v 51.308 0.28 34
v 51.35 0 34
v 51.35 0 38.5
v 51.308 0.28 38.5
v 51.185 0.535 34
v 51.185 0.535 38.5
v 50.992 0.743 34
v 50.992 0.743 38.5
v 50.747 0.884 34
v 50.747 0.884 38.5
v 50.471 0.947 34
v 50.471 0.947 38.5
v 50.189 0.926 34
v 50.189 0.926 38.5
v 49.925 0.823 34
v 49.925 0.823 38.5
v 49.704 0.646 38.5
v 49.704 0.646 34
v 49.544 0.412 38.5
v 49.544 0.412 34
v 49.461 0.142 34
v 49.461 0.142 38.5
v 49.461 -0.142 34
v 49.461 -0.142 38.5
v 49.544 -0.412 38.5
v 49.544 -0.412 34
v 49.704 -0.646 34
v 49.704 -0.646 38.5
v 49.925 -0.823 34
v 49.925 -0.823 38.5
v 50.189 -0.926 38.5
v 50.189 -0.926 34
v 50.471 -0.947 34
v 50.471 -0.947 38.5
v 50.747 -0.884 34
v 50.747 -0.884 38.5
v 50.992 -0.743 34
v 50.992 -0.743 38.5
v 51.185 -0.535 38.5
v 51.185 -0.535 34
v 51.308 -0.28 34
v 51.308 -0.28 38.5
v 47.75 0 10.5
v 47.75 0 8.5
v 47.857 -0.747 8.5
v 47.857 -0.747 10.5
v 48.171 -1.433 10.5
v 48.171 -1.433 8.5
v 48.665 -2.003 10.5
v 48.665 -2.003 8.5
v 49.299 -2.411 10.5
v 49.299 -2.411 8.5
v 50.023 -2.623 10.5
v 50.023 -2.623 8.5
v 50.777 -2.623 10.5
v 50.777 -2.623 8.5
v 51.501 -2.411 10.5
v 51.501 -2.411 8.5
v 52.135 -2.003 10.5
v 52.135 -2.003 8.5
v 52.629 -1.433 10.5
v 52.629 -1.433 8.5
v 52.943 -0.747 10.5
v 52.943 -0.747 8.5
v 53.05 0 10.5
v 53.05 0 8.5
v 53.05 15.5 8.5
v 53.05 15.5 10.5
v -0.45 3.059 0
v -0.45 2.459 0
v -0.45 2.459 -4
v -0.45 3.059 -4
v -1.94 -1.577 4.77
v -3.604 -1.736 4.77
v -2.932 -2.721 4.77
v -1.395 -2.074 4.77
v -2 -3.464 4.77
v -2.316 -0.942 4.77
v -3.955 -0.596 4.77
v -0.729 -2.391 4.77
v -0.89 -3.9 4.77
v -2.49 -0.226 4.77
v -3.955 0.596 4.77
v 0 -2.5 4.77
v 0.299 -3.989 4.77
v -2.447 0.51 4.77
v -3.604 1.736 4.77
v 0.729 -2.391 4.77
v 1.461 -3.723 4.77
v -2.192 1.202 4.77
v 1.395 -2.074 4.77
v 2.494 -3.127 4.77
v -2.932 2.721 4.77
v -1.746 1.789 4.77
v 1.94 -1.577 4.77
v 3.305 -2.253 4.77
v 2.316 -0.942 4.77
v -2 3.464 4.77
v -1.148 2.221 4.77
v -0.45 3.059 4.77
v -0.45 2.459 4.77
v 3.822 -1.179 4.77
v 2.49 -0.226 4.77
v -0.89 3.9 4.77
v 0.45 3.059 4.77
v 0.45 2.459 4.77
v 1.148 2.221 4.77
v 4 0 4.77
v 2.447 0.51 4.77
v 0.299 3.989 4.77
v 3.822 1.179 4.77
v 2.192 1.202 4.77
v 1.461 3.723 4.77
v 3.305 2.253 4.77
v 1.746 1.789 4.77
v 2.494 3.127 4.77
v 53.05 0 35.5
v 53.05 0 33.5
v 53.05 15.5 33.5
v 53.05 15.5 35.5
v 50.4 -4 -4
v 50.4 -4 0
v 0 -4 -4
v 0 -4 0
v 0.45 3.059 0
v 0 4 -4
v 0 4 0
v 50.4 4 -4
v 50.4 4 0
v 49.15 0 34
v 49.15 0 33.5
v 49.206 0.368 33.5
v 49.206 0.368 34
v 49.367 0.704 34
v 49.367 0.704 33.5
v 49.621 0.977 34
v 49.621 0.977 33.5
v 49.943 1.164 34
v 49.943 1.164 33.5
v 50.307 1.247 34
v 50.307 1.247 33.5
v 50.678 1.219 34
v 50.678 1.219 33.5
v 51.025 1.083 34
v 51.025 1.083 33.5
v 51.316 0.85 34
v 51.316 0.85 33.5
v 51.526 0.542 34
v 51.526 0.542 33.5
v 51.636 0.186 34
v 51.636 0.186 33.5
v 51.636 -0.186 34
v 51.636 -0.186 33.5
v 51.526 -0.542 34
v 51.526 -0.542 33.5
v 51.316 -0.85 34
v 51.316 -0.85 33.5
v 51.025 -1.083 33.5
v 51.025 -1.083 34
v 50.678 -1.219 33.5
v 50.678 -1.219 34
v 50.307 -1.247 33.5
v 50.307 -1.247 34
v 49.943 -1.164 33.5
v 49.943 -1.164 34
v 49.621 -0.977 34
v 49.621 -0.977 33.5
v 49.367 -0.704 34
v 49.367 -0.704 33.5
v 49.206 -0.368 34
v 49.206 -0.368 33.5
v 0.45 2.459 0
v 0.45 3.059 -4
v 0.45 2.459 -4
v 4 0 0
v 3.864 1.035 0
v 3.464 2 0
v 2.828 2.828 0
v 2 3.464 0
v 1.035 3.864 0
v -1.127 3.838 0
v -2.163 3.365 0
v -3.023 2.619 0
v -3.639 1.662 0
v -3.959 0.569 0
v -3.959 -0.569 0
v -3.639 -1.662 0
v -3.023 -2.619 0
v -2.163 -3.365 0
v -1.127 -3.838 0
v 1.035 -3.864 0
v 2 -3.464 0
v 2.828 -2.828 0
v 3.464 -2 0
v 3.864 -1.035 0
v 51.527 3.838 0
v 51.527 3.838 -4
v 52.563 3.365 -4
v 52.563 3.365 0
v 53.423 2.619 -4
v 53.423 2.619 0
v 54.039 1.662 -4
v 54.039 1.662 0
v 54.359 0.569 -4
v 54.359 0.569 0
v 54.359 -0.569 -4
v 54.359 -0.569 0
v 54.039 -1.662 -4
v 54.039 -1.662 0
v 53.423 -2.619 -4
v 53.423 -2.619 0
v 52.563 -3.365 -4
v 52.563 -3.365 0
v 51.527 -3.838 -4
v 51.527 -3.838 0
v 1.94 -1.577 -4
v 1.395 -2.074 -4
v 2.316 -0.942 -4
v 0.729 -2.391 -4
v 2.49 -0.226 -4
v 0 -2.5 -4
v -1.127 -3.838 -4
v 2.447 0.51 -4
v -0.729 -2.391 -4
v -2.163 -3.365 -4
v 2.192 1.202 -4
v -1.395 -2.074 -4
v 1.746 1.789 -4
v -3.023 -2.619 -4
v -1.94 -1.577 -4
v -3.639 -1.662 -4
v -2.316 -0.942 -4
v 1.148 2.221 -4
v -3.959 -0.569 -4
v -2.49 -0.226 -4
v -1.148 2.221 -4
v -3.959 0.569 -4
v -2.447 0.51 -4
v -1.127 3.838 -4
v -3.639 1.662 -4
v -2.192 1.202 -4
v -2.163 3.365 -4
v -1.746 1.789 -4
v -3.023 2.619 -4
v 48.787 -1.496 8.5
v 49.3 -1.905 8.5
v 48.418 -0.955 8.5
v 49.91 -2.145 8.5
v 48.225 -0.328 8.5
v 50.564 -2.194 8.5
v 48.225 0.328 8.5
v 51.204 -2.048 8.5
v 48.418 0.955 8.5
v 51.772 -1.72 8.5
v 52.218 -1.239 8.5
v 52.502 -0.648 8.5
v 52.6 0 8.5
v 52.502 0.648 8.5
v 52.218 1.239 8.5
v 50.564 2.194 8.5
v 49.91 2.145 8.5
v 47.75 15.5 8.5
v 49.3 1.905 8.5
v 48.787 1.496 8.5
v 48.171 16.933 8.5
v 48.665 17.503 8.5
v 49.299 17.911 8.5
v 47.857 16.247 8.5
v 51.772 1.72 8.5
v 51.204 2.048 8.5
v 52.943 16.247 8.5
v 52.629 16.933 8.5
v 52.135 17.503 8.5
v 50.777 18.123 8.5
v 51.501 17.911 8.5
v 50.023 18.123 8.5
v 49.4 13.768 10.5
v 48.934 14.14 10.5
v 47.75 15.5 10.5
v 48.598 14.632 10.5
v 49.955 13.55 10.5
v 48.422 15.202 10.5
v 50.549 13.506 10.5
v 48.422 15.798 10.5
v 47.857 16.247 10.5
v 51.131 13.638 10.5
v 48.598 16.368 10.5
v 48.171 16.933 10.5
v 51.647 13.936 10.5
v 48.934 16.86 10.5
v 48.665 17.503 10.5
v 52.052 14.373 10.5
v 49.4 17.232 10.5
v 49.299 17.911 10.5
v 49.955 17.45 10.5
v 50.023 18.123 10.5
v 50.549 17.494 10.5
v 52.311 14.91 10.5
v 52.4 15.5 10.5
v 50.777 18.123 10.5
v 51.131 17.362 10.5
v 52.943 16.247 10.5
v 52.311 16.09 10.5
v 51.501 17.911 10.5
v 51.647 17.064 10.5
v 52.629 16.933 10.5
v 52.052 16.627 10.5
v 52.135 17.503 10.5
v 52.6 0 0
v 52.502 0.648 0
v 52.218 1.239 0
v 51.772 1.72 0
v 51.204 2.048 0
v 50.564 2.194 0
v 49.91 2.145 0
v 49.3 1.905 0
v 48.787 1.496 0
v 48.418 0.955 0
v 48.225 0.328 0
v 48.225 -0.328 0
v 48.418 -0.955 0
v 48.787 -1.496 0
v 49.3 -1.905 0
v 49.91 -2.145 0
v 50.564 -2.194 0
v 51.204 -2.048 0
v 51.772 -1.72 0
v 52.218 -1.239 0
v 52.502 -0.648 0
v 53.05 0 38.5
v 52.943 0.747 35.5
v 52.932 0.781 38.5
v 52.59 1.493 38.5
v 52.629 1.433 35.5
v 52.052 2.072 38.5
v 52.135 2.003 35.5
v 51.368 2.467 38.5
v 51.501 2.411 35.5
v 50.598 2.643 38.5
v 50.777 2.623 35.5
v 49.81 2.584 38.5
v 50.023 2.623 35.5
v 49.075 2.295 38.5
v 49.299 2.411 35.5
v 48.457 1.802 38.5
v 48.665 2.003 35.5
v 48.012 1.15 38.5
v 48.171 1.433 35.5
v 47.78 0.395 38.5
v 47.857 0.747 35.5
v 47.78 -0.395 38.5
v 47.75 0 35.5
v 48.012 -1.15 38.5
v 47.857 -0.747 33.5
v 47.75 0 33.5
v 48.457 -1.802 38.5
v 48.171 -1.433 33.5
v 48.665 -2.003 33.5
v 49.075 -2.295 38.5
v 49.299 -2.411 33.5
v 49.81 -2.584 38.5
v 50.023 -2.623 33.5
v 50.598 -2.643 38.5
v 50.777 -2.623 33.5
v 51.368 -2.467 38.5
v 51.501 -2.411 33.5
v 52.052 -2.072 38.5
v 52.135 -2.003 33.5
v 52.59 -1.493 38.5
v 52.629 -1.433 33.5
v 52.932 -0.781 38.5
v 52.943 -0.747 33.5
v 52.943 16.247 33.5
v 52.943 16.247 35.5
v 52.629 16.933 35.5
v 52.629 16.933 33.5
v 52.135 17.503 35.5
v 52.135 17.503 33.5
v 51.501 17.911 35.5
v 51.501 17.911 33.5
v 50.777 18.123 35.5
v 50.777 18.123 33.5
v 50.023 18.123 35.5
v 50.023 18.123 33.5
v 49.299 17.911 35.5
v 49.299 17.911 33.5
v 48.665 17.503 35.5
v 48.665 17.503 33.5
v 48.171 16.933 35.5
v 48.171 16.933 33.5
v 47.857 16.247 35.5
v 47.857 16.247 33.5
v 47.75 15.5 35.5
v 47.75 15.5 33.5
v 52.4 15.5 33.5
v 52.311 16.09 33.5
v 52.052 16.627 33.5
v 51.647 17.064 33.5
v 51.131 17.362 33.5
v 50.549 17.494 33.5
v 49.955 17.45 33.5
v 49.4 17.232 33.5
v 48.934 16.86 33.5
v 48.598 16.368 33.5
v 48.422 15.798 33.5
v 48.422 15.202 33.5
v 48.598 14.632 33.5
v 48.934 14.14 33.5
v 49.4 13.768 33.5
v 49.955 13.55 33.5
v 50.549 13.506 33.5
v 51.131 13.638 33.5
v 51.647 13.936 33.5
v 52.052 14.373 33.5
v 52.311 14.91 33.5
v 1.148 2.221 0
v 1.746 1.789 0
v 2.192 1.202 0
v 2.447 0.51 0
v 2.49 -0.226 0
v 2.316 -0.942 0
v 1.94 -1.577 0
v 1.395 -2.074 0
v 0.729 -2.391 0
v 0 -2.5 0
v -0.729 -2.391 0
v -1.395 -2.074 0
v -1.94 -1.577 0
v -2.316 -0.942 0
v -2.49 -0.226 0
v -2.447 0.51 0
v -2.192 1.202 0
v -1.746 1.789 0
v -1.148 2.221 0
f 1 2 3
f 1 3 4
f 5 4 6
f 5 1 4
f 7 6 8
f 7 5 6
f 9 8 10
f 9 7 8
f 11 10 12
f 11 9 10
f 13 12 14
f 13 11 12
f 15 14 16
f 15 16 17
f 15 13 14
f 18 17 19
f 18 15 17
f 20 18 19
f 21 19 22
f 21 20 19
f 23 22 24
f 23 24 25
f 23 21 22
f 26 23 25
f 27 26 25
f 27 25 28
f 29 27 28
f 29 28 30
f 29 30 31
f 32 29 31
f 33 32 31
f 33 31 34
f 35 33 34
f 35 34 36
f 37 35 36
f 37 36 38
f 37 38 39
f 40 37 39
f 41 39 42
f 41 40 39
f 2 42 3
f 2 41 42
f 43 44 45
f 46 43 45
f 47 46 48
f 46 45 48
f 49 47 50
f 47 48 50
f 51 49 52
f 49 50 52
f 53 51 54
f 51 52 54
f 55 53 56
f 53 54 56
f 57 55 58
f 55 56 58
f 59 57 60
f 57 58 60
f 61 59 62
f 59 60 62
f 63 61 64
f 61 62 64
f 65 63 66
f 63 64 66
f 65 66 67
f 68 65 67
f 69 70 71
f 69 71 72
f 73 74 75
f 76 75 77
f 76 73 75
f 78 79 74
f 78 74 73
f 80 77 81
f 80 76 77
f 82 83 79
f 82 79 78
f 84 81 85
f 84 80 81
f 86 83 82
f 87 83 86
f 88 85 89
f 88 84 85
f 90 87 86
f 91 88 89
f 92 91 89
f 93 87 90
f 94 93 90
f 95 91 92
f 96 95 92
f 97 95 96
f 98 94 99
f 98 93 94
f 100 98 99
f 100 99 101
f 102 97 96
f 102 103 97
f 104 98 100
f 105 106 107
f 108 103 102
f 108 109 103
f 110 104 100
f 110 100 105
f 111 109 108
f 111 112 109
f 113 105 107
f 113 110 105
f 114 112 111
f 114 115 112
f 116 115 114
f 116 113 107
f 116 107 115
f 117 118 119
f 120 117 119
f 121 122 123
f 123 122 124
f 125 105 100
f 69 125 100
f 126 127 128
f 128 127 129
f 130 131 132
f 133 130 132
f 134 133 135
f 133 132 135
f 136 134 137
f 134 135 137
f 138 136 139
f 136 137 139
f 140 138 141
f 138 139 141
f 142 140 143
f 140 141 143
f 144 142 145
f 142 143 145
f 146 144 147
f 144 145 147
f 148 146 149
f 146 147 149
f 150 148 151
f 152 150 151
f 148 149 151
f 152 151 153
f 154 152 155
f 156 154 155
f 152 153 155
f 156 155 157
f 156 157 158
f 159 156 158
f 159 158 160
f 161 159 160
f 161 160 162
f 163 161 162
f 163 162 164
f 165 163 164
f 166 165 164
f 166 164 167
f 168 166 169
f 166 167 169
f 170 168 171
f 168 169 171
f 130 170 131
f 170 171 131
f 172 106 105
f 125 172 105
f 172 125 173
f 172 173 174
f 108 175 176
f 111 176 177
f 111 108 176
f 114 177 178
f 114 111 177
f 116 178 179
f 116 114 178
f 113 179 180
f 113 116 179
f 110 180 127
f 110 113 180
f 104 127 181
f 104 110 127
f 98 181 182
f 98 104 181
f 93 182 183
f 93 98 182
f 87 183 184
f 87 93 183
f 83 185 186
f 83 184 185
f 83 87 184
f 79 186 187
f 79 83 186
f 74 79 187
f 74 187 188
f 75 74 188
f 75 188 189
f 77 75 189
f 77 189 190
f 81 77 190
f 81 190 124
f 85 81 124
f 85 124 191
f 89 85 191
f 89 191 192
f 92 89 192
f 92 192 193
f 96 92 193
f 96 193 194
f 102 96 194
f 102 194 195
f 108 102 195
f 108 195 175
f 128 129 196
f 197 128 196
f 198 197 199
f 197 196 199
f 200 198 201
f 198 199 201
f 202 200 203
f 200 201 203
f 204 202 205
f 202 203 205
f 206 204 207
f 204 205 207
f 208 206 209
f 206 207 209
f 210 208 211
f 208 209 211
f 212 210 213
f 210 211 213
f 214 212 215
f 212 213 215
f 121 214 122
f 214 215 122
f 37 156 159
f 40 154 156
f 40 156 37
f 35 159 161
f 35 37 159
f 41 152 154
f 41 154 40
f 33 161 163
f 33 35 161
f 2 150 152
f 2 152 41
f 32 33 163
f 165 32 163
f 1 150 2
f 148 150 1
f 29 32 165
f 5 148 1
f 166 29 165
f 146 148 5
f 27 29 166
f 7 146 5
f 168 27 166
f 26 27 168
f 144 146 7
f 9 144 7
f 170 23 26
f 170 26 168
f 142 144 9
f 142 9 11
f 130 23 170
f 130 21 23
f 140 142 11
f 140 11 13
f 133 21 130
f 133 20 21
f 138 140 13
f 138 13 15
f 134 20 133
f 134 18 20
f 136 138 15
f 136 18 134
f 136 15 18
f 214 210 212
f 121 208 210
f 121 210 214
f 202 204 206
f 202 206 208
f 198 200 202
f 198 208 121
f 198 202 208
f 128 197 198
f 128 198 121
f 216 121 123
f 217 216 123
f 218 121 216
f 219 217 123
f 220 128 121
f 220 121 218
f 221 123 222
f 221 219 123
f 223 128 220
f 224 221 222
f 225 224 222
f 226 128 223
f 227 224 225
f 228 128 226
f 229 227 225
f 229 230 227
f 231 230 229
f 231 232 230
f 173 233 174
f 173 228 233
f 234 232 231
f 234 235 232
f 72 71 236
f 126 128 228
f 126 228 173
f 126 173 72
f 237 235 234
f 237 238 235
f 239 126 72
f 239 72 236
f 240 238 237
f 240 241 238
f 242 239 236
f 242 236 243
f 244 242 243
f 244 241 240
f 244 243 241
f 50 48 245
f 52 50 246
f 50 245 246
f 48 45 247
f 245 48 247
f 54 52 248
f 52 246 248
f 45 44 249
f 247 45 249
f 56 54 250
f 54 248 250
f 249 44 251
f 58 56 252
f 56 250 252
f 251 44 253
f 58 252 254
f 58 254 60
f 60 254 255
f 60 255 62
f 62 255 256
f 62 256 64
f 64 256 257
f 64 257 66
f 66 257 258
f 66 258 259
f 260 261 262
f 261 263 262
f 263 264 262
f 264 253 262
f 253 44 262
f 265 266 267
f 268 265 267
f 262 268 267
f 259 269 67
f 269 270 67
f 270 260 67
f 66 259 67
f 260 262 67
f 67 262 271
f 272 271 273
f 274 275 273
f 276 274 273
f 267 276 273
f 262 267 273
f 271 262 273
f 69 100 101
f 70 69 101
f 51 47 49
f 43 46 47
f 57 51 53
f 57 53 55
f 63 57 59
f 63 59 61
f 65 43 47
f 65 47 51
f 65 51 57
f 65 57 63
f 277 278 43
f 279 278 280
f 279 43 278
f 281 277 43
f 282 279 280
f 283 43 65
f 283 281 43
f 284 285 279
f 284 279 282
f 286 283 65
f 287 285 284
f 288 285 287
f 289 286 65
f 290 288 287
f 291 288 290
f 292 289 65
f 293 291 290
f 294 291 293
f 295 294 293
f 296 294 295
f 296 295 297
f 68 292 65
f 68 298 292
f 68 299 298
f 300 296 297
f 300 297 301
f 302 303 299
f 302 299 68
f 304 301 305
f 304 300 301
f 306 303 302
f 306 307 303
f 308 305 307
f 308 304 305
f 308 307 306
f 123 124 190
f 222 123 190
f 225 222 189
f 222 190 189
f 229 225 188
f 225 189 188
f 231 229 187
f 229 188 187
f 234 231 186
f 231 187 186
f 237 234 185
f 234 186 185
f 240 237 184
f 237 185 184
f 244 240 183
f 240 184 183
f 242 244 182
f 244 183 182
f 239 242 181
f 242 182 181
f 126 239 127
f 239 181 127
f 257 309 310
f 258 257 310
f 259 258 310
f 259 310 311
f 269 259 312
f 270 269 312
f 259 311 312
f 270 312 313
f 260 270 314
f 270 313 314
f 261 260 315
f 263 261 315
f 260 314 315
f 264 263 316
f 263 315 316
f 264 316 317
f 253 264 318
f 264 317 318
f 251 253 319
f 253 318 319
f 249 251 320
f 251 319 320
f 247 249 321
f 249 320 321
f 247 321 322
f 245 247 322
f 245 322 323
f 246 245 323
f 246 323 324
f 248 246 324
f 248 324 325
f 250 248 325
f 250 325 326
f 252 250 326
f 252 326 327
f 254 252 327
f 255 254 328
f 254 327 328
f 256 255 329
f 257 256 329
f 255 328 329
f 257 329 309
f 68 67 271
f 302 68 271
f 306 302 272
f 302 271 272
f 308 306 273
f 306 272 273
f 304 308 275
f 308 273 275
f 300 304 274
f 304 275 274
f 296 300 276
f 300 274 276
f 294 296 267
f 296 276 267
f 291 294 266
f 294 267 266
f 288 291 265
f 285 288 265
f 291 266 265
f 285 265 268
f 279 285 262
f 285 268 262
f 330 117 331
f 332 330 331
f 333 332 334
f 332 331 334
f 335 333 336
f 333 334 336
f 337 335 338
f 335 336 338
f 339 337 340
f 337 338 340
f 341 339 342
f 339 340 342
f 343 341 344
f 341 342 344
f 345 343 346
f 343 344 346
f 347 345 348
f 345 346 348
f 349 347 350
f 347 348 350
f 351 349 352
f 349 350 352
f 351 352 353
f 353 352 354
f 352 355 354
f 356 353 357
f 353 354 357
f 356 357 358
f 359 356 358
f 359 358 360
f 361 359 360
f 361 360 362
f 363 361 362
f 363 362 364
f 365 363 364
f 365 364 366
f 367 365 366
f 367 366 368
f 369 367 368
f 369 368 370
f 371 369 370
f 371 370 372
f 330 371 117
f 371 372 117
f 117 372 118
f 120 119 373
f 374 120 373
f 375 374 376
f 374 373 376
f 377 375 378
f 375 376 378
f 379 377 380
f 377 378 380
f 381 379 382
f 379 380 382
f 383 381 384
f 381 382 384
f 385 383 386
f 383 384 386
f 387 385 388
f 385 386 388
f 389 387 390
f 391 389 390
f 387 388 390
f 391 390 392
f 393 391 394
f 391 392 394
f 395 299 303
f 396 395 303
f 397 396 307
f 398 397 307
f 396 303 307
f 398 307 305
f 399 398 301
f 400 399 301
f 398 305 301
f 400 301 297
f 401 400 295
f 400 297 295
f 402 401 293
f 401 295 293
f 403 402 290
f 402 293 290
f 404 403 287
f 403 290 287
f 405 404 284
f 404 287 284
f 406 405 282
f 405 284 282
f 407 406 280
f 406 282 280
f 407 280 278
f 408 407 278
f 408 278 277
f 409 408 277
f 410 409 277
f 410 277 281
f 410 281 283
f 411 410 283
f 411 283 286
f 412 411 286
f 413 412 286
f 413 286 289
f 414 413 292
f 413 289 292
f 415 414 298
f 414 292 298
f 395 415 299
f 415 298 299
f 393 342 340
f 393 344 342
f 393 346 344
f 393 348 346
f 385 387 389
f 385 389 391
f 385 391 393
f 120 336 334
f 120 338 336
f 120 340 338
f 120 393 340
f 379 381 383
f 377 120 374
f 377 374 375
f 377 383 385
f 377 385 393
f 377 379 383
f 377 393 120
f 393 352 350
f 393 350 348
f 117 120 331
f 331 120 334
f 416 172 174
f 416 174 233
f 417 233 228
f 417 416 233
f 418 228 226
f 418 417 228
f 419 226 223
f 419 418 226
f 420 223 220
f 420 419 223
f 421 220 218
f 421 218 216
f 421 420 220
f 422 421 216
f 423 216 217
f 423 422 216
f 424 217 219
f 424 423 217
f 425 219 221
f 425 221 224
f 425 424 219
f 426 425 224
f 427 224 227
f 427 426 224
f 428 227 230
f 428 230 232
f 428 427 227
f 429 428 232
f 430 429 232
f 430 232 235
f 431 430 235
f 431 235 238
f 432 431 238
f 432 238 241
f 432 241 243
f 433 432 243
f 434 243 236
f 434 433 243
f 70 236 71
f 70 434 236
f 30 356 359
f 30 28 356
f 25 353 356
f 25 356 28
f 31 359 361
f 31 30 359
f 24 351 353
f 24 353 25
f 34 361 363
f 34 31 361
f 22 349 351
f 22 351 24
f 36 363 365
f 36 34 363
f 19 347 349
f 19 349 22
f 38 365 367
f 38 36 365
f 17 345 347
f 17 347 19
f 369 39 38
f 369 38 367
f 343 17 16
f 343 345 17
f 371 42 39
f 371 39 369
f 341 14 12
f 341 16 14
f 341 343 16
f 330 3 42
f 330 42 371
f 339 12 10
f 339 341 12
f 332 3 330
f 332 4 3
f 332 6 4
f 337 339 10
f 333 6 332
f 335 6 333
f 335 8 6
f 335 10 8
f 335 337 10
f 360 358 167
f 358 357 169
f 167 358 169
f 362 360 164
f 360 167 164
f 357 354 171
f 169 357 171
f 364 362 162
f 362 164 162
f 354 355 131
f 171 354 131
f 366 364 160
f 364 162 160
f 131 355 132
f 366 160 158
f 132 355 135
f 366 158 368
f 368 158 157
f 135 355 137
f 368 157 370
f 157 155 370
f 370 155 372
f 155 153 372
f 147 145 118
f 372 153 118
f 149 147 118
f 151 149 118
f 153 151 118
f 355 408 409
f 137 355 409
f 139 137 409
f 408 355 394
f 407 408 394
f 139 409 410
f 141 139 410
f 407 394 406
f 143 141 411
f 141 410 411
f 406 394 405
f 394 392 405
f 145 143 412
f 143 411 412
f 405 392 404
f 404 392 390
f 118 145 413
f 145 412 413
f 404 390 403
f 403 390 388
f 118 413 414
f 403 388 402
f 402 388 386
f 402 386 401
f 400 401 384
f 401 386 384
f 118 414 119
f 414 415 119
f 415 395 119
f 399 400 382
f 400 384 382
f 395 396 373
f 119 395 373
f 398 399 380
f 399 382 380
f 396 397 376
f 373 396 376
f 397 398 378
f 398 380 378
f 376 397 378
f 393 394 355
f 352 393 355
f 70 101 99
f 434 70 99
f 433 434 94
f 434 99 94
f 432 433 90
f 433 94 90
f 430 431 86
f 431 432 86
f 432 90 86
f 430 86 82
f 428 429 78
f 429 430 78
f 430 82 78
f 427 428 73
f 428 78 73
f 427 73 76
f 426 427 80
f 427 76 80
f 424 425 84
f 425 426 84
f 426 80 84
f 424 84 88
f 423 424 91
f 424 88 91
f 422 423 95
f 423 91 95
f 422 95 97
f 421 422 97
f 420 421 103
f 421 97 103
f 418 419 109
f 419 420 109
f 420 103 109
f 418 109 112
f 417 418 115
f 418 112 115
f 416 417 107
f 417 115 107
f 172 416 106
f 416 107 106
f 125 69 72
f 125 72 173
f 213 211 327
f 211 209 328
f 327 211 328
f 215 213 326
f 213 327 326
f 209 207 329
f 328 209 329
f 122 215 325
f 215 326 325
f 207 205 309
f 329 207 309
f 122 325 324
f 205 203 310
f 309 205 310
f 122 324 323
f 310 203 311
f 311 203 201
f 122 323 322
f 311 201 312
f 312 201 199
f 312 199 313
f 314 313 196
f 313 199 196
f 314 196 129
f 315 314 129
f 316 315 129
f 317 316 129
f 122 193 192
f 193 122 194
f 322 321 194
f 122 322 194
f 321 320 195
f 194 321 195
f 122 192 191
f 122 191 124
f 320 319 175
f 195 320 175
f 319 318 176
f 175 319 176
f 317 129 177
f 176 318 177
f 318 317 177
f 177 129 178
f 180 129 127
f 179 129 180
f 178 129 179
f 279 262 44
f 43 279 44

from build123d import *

# Parameters (mm, degrees)
SALIENTE_EXTRUIR1_DEPTH = 4
SALIENTE_EXTRUIR2_START = 4.77
CROQUIS2_R              = 4
SALIENTE_EXTRUIR2_DEPTH = 4.77
CROQUIS3_R              = 2.2
SALIENTE_EXTRUIR3_DEPTH = 8.5
SALIENTE_EXTRUIR4_DEPTH = 2
CROQUIS5_R              = 2
SALIENTE_EXTRUIR5_DEPTH = 23
CROQUIS6_R              = 0.95
SALIENTE_EXTRUIR6_DEPTH = 2
CROQUIS7_R              = 2.65
CROQUIS7_R_2            = 0.95
SALIENTE_EXTRUIR7_DEPTH = 3
CROQUIS8_R              = 1.25
CORTAR_EXTRUIR1_DEPTH   = 0.5


with BuildPart() as part:
    # Croquis1 → Saliente-Extruir1 (new body)
    with BuildSketch(Plane.XY):
        with BuildLine():
            Line((0, 4), (50.4, 4))
            ThreePointArc((50.4, 4), (54.4, 0), (50.4, -4))
            Line((50.4, -4), (0, -4))
            ThreePointArc((0, -4), (-4, 0), (0, 4))
        make_face()
        with BuildLine():
            Line((-0.45, 2.459166525), (-0.45, 3.059166525))
            Line((-0.45, 3.059166525), (0.45, 3.059166525))
            Line((0.45, 3.059166525), (0.45, 2.459166525))
            ThreePointArc((0.45, 2.459166525), (0, -2.5), (-0.45, 2.459166525))
        make_face(mode=Mode.SUBTRACT)
    extrude(amount=-SALIENTE_EXTRUIR1_DEPTH)

    # Croquis2 → Saliente-Extruir2 (add)
    with BuildSketch(Plane.XY.offset(SALIENTE_EXTRUIR2_START)):
        Circle(CROQUIS2_R)
        with BuildLine():
            Line((-0.45, 3.059166525), (-0.45, 2.459166525))
            ThreePointArc((-0.45, 2.459166525), (0, -2.5), (0.45, 2.459166525))
            Line((0.45, 2.459166525), (0.45, 3.059166525))
            Line((0.45, 3.059166525), (-0.45, 3.059166525))
        make_face(mode=Mode.SUBTRACT)
    extrude(amount=-SALIENTE_EXTRUIR2_DEPTH)

    # Croquis3 → Saliente-Extruir3 (add)
    with BuildSketch(Plane.XY):
        with Locations((50.4, 0)):
            Circle(CROQUIS3_R)
    extrude(amount=SALIENTE_EXTRUIR3_DEPTH)

    # Croquis4 → Saliente-Extruir4 (add)
    with BuildSketch(Plane.XY.offset(8.5)):
        with BuildLine():
            Line((47.75, 15.5), (47.75, 0))
            ThreePointArc((47.75, 0), (50.4, -2.65), (53.05, 0))
            Line((53.05, 0), (53.05, 15.5))
            ThreePointArc((53.05, 15.5), (50.4, 18.15), (47.75, 15.5))
        make_face()
    extrude(amount=SALIENTE_EXTRUIR4_DEPTH)

    # Croquis5 → Saliente-Extruir5 (add)
    with BuildSketch(Plane.XY.offset(10.5)):
        with Locations((50.4, 15.5)):
            Circle(CROQUIS5_R)
    extrude(amount=SALIENTE_EXTRUIR5_DEPTH)

    # Croquis6 → Saliente-Extruir6 (add)
    with BuildSketch(Plane.XY.offset(33.5)):
        with BuildLine():
            Line((47.75, 15.5), (47.75, 0))
            ThreePointArc((47.75, 0), (50.4, -2.65), (53.05, 0))
            Line((53.05, 0), (53.05, 15.5))
            ThreePointArc((53.05, 15.5), (50.4, 18.15), (47.75, 15.5))
        make_face()
        with Locations((50.4, 0)):
            Circle(CROQUIS6_R, mode=Mode.SUBTRACT)
    extrude(amount=SALIENTE_EXTRUIR6_DEPTH)

    # Croquis7 → Saliente-Extruir7 (add)
    with BuildSketch(Plane.XY.offset(35.5)):
        with Locations((50.4, 0)):
            Circle(CROQUIS7_R)
        with Locations((50.4, 0)):
            Circle(CROQUIS7_R_2, mode=Mode.SUBTRACT)
    extrude(amount=SALIENTE_EXTRUIR7_DEPTH)

    # Croquis8 → Cortar-Extruir1 (cut)
    with BuildSketch(Plane(origin=(0, 0, 33.5), x_dir=(-1, 0, 0), z_dir=(0, 0, -1))):
        with Locations((-50.4, 0)):
            Circle(CROQUIS8_R)
    extrude(amount=-CORTAR_EXTRUIR1_DEPTH, mode=Mode.SUBTRACT)


solid = part.part
